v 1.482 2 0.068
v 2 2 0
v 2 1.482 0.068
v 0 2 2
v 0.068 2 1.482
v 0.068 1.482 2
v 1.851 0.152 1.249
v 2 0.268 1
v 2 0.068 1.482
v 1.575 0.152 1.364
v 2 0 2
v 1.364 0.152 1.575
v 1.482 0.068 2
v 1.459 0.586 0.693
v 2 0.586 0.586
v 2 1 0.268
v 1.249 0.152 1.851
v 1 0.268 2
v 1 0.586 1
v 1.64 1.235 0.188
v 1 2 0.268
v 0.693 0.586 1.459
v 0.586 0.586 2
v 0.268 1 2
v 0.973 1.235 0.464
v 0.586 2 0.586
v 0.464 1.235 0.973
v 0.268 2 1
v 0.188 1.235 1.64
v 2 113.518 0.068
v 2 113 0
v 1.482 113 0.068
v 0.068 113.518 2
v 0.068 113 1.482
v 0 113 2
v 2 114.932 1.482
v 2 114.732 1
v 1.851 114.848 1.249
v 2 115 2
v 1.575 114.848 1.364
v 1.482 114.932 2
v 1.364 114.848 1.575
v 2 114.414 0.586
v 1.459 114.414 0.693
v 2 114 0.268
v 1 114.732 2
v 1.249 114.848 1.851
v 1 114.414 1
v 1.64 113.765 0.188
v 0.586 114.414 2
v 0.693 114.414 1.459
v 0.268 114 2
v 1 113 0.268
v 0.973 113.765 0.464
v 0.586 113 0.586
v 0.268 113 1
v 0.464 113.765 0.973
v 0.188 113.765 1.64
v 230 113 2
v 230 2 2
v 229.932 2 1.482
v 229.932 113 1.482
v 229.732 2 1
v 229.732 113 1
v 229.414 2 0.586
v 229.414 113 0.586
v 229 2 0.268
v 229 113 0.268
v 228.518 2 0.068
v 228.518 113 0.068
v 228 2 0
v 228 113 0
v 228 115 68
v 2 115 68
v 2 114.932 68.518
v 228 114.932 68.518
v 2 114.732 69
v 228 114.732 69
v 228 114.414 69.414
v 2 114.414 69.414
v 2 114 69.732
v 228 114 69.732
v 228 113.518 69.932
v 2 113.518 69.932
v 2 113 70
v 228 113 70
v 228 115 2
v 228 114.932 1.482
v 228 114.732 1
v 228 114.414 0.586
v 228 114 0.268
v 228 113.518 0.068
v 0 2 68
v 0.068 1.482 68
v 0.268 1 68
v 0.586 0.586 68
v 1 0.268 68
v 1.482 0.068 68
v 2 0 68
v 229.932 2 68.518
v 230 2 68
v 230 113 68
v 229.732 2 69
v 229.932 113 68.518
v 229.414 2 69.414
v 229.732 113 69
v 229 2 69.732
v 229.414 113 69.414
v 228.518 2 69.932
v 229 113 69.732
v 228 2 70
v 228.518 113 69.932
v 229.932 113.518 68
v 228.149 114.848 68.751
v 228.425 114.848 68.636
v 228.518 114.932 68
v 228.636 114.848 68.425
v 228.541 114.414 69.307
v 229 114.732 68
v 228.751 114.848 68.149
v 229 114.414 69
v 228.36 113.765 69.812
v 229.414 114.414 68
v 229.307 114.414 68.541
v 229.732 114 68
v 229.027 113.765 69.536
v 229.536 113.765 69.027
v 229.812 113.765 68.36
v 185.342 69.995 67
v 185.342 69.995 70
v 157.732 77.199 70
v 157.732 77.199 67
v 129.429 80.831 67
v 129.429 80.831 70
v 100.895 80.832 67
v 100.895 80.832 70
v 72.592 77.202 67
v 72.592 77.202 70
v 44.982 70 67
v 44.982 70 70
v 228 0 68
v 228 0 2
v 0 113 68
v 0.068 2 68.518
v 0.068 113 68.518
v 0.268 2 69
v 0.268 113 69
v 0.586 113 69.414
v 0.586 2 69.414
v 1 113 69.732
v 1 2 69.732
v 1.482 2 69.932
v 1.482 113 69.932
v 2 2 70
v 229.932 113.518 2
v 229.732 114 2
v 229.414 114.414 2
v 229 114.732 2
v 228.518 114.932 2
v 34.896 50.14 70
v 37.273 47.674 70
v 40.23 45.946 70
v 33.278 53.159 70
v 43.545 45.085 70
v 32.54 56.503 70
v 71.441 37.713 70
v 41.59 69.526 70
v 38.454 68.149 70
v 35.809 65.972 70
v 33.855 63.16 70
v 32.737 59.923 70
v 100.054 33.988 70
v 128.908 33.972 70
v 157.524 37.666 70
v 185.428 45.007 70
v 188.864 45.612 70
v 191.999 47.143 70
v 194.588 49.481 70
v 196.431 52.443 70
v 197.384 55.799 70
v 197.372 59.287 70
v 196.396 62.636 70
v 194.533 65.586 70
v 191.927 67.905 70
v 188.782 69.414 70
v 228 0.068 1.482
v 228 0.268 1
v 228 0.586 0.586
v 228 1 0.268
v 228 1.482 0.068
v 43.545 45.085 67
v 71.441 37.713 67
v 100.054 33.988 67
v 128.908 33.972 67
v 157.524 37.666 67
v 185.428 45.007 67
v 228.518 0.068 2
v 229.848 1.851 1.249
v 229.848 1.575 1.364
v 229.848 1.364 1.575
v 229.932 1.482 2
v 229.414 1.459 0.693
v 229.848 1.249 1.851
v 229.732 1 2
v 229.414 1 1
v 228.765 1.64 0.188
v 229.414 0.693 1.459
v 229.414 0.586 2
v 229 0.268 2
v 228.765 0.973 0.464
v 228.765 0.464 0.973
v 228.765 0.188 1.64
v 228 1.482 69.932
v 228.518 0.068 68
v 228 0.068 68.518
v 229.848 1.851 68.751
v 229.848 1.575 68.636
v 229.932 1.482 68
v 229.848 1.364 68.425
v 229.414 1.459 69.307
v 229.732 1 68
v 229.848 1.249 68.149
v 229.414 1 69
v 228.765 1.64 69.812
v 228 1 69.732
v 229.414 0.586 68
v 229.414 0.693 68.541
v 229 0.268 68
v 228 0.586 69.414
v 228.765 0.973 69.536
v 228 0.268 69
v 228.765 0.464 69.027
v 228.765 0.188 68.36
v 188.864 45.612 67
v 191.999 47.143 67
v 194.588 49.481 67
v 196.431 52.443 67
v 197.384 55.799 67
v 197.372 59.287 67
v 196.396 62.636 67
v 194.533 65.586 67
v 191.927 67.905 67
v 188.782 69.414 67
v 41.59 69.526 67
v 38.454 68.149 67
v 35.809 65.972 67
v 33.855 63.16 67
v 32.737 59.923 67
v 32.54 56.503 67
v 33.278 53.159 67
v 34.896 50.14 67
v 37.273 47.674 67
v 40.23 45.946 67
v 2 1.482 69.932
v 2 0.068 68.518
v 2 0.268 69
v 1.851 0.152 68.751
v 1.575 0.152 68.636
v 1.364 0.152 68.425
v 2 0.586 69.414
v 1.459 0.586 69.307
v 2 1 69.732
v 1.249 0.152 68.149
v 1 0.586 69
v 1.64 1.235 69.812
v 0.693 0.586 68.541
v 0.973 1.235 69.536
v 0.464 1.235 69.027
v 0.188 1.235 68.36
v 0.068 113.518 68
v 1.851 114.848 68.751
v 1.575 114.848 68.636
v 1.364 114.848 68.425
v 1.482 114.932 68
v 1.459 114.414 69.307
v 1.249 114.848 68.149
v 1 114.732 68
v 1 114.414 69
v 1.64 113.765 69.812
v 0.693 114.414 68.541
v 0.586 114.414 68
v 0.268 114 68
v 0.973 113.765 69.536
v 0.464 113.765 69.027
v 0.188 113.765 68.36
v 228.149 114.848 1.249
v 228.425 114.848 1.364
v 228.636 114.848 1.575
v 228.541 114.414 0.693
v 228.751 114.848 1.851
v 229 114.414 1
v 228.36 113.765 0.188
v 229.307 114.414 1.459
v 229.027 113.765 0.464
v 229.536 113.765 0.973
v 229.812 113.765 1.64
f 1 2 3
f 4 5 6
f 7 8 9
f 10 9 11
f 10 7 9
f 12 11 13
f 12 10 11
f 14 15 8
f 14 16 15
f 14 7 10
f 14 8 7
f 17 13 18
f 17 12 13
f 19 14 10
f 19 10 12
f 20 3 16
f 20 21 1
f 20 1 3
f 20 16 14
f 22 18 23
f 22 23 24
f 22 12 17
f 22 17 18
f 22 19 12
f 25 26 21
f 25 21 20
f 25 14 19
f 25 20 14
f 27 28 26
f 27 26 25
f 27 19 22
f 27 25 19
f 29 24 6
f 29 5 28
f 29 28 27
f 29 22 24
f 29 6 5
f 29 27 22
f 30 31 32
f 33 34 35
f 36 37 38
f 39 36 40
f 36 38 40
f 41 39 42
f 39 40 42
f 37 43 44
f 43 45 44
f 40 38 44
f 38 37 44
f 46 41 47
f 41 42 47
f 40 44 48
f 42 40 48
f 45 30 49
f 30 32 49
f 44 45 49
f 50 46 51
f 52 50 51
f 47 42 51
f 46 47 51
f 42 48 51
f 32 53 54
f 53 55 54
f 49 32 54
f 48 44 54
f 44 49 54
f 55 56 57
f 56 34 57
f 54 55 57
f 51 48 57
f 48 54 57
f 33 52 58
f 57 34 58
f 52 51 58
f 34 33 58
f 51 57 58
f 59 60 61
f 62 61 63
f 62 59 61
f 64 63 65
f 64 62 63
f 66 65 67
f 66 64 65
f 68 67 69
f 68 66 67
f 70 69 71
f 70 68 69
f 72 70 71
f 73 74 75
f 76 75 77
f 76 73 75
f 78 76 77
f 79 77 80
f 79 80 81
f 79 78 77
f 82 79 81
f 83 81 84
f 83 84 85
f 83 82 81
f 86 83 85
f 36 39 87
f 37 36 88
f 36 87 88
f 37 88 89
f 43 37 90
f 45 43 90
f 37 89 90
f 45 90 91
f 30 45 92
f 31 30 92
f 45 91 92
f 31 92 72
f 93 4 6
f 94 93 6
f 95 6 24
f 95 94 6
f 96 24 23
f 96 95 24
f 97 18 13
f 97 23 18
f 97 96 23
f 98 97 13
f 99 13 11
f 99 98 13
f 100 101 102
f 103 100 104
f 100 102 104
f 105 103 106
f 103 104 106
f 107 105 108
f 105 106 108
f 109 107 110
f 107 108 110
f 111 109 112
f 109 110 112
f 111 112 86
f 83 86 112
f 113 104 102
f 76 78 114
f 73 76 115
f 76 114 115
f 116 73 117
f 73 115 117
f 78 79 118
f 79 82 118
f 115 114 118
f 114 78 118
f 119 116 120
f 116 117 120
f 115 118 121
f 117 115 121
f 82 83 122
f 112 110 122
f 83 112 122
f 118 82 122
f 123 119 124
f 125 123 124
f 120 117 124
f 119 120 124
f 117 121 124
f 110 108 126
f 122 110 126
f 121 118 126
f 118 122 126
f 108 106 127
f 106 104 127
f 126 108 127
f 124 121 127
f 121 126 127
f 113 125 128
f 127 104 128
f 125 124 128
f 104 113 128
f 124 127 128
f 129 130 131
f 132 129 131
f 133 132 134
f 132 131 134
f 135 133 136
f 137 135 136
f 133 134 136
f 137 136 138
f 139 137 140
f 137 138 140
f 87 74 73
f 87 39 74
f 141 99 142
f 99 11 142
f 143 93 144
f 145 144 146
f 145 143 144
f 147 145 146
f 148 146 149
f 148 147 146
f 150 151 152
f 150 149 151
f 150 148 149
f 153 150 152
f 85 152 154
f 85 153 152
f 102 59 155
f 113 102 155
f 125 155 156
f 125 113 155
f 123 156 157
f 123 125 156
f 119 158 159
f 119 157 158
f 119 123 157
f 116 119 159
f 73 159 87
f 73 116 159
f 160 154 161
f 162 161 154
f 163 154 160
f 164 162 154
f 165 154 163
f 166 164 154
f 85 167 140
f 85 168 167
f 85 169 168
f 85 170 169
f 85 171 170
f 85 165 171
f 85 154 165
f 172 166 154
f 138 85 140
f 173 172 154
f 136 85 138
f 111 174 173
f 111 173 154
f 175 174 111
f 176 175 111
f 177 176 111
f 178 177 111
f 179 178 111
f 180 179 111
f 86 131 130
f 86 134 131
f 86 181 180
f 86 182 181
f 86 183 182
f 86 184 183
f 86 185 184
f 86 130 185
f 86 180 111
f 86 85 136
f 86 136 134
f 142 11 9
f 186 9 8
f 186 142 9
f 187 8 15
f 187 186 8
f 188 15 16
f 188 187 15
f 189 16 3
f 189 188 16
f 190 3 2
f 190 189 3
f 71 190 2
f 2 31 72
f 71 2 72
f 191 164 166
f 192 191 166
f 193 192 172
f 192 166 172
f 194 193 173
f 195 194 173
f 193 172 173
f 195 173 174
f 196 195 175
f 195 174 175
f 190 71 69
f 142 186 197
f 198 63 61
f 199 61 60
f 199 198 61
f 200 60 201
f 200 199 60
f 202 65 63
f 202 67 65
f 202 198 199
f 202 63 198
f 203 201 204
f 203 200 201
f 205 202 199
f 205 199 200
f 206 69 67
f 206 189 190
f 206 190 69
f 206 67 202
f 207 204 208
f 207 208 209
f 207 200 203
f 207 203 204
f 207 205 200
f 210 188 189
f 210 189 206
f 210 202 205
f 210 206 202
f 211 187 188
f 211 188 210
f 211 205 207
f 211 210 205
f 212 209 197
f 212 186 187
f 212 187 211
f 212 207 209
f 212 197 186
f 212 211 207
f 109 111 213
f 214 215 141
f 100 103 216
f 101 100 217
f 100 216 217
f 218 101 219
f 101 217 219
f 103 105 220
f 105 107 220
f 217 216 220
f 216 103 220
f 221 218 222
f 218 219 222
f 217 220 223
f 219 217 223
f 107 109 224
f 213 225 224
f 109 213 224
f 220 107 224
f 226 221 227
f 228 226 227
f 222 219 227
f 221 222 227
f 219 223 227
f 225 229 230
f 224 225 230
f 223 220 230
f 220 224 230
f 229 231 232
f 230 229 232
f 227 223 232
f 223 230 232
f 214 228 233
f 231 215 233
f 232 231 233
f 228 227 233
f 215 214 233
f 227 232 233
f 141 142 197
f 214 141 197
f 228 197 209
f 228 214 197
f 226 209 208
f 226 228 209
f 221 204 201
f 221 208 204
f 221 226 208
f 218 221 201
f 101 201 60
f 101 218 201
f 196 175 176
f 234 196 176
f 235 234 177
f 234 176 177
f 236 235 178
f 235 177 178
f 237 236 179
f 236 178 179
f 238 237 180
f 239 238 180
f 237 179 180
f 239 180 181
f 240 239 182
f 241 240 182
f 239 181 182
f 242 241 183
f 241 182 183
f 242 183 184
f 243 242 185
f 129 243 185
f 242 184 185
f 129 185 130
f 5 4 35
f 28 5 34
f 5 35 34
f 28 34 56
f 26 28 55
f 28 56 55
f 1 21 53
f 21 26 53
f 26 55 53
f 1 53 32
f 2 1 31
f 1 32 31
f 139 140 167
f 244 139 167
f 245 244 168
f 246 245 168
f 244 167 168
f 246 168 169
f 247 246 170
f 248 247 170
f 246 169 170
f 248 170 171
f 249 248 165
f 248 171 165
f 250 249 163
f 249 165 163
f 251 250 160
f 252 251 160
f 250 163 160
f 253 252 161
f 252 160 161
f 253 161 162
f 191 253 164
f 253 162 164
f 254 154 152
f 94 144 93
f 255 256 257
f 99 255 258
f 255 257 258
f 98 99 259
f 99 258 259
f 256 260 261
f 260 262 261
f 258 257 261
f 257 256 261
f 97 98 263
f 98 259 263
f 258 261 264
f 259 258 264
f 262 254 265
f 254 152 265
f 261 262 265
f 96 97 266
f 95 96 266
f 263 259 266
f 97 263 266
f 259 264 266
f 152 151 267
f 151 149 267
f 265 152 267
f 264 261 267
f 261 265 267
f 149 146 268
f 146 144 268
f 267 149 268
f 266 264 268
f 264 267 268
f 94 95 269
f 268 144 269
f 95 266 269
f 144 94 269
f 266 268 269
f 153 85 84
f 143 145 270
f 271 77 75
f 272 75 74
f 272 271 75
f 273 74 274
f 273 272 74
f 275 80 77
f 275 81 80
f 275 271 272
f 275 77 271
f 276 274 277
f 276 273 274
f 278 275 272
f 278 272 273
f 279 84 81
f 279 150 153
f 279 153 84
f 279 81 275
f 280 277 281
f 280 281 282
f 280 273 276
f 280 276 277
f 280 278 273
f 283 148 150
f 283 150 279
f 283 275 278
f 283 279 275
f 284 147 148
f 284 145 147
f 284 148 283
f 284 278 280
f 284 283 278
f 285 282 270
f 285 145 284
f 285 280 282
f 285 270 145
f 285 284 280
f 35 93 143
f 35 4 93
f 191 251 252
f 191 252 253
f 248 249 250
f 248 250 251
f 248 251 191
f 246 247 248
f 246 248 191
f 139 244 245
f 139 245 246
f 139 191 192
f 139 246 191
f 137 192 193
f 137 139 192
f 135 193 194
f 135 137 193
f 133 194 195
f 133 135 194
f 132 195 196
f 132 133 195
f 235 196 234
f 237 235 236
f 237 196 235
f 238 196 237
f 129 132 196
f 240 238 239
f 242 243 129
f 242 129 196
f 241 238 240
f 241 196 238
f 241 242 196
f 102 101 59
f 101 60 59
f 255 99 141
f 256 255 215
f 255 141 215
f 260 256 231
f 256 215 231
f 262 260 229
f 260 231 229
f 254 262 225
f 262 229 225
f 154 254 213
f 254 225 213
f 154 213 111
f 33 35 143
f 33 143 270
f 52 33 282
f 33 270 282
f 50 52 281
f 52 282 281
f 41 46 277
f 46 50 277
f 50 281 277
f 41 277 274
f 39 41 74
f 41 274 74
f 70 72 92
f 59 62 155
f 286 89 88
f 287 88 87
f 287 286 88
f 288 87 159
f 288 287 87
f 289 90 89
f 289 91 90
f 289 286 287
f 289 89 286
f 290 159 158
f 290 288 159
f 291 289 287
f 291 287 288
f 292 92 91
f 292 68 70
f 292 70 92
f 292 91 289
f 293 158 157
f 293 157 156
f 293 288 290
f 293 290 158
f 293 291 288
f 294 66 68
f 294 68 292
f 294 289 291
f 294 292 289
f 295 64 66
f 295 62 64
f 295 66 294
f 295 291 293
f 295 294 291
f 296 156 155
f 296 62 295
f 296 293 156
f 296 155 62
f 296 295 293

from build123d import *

# Parameters (mm, degrees)
F0_W     = 230
F0_H     = 115
F1_DEPTH = 70
F2_R     = 2
F4_DEPTH = 3


with BuildPart() as f1:
    # F0 (on Top) → F1 (new body)
    with BuildSketch(Plane.XY):
        with Locations((115, 57.5)):
            Rectangle(F0_W, F0_H)
    extrude(amount=F1_DEPTH)

    # F2
    f2_edges = [f1.edges().sort_by_distance(p)[0] for p in [
        (0, 57.5, 70),
        (115, 0, 70),
        (230, 57.5, 70),
        (115, 115, 70),
        (0, 57.5, 0),
        (115, 0, 0),
        (230, 57.5, 0),
        (115, 115, 0),
        (230, 0, 35),
        (230, 115, 35),
        (0, 115, 35),
        (0, 0, 35),
    ]]
    fillet(f2_edges, radius=F2_R)

    # F3 (on face) → F4 (cut)
    with BuildSketch(Plane.XY.offset(70)):
        with BuildLine():
            ThreePointArc((185.3419, 69.995323), (115.162282, 81.286695), (44.981913, 69.999987))
            ThreePointArc((44.981913, 69.999987), (32.520736, 58.219704), (43.545014, 45.084968))
            ThreePointArc((43.545014, 45.084968), (114.480414, 33.514818), (185.42843, 45.007344))
            ThreePointArc((185.42843, 45.007344), (197.499925, 57.543286), (185.3419, 69.995323))
        make_face()
    extrude(amount=-F4_DEPTH, mode=Mode.SUBTRACT)


solid = f1.part
